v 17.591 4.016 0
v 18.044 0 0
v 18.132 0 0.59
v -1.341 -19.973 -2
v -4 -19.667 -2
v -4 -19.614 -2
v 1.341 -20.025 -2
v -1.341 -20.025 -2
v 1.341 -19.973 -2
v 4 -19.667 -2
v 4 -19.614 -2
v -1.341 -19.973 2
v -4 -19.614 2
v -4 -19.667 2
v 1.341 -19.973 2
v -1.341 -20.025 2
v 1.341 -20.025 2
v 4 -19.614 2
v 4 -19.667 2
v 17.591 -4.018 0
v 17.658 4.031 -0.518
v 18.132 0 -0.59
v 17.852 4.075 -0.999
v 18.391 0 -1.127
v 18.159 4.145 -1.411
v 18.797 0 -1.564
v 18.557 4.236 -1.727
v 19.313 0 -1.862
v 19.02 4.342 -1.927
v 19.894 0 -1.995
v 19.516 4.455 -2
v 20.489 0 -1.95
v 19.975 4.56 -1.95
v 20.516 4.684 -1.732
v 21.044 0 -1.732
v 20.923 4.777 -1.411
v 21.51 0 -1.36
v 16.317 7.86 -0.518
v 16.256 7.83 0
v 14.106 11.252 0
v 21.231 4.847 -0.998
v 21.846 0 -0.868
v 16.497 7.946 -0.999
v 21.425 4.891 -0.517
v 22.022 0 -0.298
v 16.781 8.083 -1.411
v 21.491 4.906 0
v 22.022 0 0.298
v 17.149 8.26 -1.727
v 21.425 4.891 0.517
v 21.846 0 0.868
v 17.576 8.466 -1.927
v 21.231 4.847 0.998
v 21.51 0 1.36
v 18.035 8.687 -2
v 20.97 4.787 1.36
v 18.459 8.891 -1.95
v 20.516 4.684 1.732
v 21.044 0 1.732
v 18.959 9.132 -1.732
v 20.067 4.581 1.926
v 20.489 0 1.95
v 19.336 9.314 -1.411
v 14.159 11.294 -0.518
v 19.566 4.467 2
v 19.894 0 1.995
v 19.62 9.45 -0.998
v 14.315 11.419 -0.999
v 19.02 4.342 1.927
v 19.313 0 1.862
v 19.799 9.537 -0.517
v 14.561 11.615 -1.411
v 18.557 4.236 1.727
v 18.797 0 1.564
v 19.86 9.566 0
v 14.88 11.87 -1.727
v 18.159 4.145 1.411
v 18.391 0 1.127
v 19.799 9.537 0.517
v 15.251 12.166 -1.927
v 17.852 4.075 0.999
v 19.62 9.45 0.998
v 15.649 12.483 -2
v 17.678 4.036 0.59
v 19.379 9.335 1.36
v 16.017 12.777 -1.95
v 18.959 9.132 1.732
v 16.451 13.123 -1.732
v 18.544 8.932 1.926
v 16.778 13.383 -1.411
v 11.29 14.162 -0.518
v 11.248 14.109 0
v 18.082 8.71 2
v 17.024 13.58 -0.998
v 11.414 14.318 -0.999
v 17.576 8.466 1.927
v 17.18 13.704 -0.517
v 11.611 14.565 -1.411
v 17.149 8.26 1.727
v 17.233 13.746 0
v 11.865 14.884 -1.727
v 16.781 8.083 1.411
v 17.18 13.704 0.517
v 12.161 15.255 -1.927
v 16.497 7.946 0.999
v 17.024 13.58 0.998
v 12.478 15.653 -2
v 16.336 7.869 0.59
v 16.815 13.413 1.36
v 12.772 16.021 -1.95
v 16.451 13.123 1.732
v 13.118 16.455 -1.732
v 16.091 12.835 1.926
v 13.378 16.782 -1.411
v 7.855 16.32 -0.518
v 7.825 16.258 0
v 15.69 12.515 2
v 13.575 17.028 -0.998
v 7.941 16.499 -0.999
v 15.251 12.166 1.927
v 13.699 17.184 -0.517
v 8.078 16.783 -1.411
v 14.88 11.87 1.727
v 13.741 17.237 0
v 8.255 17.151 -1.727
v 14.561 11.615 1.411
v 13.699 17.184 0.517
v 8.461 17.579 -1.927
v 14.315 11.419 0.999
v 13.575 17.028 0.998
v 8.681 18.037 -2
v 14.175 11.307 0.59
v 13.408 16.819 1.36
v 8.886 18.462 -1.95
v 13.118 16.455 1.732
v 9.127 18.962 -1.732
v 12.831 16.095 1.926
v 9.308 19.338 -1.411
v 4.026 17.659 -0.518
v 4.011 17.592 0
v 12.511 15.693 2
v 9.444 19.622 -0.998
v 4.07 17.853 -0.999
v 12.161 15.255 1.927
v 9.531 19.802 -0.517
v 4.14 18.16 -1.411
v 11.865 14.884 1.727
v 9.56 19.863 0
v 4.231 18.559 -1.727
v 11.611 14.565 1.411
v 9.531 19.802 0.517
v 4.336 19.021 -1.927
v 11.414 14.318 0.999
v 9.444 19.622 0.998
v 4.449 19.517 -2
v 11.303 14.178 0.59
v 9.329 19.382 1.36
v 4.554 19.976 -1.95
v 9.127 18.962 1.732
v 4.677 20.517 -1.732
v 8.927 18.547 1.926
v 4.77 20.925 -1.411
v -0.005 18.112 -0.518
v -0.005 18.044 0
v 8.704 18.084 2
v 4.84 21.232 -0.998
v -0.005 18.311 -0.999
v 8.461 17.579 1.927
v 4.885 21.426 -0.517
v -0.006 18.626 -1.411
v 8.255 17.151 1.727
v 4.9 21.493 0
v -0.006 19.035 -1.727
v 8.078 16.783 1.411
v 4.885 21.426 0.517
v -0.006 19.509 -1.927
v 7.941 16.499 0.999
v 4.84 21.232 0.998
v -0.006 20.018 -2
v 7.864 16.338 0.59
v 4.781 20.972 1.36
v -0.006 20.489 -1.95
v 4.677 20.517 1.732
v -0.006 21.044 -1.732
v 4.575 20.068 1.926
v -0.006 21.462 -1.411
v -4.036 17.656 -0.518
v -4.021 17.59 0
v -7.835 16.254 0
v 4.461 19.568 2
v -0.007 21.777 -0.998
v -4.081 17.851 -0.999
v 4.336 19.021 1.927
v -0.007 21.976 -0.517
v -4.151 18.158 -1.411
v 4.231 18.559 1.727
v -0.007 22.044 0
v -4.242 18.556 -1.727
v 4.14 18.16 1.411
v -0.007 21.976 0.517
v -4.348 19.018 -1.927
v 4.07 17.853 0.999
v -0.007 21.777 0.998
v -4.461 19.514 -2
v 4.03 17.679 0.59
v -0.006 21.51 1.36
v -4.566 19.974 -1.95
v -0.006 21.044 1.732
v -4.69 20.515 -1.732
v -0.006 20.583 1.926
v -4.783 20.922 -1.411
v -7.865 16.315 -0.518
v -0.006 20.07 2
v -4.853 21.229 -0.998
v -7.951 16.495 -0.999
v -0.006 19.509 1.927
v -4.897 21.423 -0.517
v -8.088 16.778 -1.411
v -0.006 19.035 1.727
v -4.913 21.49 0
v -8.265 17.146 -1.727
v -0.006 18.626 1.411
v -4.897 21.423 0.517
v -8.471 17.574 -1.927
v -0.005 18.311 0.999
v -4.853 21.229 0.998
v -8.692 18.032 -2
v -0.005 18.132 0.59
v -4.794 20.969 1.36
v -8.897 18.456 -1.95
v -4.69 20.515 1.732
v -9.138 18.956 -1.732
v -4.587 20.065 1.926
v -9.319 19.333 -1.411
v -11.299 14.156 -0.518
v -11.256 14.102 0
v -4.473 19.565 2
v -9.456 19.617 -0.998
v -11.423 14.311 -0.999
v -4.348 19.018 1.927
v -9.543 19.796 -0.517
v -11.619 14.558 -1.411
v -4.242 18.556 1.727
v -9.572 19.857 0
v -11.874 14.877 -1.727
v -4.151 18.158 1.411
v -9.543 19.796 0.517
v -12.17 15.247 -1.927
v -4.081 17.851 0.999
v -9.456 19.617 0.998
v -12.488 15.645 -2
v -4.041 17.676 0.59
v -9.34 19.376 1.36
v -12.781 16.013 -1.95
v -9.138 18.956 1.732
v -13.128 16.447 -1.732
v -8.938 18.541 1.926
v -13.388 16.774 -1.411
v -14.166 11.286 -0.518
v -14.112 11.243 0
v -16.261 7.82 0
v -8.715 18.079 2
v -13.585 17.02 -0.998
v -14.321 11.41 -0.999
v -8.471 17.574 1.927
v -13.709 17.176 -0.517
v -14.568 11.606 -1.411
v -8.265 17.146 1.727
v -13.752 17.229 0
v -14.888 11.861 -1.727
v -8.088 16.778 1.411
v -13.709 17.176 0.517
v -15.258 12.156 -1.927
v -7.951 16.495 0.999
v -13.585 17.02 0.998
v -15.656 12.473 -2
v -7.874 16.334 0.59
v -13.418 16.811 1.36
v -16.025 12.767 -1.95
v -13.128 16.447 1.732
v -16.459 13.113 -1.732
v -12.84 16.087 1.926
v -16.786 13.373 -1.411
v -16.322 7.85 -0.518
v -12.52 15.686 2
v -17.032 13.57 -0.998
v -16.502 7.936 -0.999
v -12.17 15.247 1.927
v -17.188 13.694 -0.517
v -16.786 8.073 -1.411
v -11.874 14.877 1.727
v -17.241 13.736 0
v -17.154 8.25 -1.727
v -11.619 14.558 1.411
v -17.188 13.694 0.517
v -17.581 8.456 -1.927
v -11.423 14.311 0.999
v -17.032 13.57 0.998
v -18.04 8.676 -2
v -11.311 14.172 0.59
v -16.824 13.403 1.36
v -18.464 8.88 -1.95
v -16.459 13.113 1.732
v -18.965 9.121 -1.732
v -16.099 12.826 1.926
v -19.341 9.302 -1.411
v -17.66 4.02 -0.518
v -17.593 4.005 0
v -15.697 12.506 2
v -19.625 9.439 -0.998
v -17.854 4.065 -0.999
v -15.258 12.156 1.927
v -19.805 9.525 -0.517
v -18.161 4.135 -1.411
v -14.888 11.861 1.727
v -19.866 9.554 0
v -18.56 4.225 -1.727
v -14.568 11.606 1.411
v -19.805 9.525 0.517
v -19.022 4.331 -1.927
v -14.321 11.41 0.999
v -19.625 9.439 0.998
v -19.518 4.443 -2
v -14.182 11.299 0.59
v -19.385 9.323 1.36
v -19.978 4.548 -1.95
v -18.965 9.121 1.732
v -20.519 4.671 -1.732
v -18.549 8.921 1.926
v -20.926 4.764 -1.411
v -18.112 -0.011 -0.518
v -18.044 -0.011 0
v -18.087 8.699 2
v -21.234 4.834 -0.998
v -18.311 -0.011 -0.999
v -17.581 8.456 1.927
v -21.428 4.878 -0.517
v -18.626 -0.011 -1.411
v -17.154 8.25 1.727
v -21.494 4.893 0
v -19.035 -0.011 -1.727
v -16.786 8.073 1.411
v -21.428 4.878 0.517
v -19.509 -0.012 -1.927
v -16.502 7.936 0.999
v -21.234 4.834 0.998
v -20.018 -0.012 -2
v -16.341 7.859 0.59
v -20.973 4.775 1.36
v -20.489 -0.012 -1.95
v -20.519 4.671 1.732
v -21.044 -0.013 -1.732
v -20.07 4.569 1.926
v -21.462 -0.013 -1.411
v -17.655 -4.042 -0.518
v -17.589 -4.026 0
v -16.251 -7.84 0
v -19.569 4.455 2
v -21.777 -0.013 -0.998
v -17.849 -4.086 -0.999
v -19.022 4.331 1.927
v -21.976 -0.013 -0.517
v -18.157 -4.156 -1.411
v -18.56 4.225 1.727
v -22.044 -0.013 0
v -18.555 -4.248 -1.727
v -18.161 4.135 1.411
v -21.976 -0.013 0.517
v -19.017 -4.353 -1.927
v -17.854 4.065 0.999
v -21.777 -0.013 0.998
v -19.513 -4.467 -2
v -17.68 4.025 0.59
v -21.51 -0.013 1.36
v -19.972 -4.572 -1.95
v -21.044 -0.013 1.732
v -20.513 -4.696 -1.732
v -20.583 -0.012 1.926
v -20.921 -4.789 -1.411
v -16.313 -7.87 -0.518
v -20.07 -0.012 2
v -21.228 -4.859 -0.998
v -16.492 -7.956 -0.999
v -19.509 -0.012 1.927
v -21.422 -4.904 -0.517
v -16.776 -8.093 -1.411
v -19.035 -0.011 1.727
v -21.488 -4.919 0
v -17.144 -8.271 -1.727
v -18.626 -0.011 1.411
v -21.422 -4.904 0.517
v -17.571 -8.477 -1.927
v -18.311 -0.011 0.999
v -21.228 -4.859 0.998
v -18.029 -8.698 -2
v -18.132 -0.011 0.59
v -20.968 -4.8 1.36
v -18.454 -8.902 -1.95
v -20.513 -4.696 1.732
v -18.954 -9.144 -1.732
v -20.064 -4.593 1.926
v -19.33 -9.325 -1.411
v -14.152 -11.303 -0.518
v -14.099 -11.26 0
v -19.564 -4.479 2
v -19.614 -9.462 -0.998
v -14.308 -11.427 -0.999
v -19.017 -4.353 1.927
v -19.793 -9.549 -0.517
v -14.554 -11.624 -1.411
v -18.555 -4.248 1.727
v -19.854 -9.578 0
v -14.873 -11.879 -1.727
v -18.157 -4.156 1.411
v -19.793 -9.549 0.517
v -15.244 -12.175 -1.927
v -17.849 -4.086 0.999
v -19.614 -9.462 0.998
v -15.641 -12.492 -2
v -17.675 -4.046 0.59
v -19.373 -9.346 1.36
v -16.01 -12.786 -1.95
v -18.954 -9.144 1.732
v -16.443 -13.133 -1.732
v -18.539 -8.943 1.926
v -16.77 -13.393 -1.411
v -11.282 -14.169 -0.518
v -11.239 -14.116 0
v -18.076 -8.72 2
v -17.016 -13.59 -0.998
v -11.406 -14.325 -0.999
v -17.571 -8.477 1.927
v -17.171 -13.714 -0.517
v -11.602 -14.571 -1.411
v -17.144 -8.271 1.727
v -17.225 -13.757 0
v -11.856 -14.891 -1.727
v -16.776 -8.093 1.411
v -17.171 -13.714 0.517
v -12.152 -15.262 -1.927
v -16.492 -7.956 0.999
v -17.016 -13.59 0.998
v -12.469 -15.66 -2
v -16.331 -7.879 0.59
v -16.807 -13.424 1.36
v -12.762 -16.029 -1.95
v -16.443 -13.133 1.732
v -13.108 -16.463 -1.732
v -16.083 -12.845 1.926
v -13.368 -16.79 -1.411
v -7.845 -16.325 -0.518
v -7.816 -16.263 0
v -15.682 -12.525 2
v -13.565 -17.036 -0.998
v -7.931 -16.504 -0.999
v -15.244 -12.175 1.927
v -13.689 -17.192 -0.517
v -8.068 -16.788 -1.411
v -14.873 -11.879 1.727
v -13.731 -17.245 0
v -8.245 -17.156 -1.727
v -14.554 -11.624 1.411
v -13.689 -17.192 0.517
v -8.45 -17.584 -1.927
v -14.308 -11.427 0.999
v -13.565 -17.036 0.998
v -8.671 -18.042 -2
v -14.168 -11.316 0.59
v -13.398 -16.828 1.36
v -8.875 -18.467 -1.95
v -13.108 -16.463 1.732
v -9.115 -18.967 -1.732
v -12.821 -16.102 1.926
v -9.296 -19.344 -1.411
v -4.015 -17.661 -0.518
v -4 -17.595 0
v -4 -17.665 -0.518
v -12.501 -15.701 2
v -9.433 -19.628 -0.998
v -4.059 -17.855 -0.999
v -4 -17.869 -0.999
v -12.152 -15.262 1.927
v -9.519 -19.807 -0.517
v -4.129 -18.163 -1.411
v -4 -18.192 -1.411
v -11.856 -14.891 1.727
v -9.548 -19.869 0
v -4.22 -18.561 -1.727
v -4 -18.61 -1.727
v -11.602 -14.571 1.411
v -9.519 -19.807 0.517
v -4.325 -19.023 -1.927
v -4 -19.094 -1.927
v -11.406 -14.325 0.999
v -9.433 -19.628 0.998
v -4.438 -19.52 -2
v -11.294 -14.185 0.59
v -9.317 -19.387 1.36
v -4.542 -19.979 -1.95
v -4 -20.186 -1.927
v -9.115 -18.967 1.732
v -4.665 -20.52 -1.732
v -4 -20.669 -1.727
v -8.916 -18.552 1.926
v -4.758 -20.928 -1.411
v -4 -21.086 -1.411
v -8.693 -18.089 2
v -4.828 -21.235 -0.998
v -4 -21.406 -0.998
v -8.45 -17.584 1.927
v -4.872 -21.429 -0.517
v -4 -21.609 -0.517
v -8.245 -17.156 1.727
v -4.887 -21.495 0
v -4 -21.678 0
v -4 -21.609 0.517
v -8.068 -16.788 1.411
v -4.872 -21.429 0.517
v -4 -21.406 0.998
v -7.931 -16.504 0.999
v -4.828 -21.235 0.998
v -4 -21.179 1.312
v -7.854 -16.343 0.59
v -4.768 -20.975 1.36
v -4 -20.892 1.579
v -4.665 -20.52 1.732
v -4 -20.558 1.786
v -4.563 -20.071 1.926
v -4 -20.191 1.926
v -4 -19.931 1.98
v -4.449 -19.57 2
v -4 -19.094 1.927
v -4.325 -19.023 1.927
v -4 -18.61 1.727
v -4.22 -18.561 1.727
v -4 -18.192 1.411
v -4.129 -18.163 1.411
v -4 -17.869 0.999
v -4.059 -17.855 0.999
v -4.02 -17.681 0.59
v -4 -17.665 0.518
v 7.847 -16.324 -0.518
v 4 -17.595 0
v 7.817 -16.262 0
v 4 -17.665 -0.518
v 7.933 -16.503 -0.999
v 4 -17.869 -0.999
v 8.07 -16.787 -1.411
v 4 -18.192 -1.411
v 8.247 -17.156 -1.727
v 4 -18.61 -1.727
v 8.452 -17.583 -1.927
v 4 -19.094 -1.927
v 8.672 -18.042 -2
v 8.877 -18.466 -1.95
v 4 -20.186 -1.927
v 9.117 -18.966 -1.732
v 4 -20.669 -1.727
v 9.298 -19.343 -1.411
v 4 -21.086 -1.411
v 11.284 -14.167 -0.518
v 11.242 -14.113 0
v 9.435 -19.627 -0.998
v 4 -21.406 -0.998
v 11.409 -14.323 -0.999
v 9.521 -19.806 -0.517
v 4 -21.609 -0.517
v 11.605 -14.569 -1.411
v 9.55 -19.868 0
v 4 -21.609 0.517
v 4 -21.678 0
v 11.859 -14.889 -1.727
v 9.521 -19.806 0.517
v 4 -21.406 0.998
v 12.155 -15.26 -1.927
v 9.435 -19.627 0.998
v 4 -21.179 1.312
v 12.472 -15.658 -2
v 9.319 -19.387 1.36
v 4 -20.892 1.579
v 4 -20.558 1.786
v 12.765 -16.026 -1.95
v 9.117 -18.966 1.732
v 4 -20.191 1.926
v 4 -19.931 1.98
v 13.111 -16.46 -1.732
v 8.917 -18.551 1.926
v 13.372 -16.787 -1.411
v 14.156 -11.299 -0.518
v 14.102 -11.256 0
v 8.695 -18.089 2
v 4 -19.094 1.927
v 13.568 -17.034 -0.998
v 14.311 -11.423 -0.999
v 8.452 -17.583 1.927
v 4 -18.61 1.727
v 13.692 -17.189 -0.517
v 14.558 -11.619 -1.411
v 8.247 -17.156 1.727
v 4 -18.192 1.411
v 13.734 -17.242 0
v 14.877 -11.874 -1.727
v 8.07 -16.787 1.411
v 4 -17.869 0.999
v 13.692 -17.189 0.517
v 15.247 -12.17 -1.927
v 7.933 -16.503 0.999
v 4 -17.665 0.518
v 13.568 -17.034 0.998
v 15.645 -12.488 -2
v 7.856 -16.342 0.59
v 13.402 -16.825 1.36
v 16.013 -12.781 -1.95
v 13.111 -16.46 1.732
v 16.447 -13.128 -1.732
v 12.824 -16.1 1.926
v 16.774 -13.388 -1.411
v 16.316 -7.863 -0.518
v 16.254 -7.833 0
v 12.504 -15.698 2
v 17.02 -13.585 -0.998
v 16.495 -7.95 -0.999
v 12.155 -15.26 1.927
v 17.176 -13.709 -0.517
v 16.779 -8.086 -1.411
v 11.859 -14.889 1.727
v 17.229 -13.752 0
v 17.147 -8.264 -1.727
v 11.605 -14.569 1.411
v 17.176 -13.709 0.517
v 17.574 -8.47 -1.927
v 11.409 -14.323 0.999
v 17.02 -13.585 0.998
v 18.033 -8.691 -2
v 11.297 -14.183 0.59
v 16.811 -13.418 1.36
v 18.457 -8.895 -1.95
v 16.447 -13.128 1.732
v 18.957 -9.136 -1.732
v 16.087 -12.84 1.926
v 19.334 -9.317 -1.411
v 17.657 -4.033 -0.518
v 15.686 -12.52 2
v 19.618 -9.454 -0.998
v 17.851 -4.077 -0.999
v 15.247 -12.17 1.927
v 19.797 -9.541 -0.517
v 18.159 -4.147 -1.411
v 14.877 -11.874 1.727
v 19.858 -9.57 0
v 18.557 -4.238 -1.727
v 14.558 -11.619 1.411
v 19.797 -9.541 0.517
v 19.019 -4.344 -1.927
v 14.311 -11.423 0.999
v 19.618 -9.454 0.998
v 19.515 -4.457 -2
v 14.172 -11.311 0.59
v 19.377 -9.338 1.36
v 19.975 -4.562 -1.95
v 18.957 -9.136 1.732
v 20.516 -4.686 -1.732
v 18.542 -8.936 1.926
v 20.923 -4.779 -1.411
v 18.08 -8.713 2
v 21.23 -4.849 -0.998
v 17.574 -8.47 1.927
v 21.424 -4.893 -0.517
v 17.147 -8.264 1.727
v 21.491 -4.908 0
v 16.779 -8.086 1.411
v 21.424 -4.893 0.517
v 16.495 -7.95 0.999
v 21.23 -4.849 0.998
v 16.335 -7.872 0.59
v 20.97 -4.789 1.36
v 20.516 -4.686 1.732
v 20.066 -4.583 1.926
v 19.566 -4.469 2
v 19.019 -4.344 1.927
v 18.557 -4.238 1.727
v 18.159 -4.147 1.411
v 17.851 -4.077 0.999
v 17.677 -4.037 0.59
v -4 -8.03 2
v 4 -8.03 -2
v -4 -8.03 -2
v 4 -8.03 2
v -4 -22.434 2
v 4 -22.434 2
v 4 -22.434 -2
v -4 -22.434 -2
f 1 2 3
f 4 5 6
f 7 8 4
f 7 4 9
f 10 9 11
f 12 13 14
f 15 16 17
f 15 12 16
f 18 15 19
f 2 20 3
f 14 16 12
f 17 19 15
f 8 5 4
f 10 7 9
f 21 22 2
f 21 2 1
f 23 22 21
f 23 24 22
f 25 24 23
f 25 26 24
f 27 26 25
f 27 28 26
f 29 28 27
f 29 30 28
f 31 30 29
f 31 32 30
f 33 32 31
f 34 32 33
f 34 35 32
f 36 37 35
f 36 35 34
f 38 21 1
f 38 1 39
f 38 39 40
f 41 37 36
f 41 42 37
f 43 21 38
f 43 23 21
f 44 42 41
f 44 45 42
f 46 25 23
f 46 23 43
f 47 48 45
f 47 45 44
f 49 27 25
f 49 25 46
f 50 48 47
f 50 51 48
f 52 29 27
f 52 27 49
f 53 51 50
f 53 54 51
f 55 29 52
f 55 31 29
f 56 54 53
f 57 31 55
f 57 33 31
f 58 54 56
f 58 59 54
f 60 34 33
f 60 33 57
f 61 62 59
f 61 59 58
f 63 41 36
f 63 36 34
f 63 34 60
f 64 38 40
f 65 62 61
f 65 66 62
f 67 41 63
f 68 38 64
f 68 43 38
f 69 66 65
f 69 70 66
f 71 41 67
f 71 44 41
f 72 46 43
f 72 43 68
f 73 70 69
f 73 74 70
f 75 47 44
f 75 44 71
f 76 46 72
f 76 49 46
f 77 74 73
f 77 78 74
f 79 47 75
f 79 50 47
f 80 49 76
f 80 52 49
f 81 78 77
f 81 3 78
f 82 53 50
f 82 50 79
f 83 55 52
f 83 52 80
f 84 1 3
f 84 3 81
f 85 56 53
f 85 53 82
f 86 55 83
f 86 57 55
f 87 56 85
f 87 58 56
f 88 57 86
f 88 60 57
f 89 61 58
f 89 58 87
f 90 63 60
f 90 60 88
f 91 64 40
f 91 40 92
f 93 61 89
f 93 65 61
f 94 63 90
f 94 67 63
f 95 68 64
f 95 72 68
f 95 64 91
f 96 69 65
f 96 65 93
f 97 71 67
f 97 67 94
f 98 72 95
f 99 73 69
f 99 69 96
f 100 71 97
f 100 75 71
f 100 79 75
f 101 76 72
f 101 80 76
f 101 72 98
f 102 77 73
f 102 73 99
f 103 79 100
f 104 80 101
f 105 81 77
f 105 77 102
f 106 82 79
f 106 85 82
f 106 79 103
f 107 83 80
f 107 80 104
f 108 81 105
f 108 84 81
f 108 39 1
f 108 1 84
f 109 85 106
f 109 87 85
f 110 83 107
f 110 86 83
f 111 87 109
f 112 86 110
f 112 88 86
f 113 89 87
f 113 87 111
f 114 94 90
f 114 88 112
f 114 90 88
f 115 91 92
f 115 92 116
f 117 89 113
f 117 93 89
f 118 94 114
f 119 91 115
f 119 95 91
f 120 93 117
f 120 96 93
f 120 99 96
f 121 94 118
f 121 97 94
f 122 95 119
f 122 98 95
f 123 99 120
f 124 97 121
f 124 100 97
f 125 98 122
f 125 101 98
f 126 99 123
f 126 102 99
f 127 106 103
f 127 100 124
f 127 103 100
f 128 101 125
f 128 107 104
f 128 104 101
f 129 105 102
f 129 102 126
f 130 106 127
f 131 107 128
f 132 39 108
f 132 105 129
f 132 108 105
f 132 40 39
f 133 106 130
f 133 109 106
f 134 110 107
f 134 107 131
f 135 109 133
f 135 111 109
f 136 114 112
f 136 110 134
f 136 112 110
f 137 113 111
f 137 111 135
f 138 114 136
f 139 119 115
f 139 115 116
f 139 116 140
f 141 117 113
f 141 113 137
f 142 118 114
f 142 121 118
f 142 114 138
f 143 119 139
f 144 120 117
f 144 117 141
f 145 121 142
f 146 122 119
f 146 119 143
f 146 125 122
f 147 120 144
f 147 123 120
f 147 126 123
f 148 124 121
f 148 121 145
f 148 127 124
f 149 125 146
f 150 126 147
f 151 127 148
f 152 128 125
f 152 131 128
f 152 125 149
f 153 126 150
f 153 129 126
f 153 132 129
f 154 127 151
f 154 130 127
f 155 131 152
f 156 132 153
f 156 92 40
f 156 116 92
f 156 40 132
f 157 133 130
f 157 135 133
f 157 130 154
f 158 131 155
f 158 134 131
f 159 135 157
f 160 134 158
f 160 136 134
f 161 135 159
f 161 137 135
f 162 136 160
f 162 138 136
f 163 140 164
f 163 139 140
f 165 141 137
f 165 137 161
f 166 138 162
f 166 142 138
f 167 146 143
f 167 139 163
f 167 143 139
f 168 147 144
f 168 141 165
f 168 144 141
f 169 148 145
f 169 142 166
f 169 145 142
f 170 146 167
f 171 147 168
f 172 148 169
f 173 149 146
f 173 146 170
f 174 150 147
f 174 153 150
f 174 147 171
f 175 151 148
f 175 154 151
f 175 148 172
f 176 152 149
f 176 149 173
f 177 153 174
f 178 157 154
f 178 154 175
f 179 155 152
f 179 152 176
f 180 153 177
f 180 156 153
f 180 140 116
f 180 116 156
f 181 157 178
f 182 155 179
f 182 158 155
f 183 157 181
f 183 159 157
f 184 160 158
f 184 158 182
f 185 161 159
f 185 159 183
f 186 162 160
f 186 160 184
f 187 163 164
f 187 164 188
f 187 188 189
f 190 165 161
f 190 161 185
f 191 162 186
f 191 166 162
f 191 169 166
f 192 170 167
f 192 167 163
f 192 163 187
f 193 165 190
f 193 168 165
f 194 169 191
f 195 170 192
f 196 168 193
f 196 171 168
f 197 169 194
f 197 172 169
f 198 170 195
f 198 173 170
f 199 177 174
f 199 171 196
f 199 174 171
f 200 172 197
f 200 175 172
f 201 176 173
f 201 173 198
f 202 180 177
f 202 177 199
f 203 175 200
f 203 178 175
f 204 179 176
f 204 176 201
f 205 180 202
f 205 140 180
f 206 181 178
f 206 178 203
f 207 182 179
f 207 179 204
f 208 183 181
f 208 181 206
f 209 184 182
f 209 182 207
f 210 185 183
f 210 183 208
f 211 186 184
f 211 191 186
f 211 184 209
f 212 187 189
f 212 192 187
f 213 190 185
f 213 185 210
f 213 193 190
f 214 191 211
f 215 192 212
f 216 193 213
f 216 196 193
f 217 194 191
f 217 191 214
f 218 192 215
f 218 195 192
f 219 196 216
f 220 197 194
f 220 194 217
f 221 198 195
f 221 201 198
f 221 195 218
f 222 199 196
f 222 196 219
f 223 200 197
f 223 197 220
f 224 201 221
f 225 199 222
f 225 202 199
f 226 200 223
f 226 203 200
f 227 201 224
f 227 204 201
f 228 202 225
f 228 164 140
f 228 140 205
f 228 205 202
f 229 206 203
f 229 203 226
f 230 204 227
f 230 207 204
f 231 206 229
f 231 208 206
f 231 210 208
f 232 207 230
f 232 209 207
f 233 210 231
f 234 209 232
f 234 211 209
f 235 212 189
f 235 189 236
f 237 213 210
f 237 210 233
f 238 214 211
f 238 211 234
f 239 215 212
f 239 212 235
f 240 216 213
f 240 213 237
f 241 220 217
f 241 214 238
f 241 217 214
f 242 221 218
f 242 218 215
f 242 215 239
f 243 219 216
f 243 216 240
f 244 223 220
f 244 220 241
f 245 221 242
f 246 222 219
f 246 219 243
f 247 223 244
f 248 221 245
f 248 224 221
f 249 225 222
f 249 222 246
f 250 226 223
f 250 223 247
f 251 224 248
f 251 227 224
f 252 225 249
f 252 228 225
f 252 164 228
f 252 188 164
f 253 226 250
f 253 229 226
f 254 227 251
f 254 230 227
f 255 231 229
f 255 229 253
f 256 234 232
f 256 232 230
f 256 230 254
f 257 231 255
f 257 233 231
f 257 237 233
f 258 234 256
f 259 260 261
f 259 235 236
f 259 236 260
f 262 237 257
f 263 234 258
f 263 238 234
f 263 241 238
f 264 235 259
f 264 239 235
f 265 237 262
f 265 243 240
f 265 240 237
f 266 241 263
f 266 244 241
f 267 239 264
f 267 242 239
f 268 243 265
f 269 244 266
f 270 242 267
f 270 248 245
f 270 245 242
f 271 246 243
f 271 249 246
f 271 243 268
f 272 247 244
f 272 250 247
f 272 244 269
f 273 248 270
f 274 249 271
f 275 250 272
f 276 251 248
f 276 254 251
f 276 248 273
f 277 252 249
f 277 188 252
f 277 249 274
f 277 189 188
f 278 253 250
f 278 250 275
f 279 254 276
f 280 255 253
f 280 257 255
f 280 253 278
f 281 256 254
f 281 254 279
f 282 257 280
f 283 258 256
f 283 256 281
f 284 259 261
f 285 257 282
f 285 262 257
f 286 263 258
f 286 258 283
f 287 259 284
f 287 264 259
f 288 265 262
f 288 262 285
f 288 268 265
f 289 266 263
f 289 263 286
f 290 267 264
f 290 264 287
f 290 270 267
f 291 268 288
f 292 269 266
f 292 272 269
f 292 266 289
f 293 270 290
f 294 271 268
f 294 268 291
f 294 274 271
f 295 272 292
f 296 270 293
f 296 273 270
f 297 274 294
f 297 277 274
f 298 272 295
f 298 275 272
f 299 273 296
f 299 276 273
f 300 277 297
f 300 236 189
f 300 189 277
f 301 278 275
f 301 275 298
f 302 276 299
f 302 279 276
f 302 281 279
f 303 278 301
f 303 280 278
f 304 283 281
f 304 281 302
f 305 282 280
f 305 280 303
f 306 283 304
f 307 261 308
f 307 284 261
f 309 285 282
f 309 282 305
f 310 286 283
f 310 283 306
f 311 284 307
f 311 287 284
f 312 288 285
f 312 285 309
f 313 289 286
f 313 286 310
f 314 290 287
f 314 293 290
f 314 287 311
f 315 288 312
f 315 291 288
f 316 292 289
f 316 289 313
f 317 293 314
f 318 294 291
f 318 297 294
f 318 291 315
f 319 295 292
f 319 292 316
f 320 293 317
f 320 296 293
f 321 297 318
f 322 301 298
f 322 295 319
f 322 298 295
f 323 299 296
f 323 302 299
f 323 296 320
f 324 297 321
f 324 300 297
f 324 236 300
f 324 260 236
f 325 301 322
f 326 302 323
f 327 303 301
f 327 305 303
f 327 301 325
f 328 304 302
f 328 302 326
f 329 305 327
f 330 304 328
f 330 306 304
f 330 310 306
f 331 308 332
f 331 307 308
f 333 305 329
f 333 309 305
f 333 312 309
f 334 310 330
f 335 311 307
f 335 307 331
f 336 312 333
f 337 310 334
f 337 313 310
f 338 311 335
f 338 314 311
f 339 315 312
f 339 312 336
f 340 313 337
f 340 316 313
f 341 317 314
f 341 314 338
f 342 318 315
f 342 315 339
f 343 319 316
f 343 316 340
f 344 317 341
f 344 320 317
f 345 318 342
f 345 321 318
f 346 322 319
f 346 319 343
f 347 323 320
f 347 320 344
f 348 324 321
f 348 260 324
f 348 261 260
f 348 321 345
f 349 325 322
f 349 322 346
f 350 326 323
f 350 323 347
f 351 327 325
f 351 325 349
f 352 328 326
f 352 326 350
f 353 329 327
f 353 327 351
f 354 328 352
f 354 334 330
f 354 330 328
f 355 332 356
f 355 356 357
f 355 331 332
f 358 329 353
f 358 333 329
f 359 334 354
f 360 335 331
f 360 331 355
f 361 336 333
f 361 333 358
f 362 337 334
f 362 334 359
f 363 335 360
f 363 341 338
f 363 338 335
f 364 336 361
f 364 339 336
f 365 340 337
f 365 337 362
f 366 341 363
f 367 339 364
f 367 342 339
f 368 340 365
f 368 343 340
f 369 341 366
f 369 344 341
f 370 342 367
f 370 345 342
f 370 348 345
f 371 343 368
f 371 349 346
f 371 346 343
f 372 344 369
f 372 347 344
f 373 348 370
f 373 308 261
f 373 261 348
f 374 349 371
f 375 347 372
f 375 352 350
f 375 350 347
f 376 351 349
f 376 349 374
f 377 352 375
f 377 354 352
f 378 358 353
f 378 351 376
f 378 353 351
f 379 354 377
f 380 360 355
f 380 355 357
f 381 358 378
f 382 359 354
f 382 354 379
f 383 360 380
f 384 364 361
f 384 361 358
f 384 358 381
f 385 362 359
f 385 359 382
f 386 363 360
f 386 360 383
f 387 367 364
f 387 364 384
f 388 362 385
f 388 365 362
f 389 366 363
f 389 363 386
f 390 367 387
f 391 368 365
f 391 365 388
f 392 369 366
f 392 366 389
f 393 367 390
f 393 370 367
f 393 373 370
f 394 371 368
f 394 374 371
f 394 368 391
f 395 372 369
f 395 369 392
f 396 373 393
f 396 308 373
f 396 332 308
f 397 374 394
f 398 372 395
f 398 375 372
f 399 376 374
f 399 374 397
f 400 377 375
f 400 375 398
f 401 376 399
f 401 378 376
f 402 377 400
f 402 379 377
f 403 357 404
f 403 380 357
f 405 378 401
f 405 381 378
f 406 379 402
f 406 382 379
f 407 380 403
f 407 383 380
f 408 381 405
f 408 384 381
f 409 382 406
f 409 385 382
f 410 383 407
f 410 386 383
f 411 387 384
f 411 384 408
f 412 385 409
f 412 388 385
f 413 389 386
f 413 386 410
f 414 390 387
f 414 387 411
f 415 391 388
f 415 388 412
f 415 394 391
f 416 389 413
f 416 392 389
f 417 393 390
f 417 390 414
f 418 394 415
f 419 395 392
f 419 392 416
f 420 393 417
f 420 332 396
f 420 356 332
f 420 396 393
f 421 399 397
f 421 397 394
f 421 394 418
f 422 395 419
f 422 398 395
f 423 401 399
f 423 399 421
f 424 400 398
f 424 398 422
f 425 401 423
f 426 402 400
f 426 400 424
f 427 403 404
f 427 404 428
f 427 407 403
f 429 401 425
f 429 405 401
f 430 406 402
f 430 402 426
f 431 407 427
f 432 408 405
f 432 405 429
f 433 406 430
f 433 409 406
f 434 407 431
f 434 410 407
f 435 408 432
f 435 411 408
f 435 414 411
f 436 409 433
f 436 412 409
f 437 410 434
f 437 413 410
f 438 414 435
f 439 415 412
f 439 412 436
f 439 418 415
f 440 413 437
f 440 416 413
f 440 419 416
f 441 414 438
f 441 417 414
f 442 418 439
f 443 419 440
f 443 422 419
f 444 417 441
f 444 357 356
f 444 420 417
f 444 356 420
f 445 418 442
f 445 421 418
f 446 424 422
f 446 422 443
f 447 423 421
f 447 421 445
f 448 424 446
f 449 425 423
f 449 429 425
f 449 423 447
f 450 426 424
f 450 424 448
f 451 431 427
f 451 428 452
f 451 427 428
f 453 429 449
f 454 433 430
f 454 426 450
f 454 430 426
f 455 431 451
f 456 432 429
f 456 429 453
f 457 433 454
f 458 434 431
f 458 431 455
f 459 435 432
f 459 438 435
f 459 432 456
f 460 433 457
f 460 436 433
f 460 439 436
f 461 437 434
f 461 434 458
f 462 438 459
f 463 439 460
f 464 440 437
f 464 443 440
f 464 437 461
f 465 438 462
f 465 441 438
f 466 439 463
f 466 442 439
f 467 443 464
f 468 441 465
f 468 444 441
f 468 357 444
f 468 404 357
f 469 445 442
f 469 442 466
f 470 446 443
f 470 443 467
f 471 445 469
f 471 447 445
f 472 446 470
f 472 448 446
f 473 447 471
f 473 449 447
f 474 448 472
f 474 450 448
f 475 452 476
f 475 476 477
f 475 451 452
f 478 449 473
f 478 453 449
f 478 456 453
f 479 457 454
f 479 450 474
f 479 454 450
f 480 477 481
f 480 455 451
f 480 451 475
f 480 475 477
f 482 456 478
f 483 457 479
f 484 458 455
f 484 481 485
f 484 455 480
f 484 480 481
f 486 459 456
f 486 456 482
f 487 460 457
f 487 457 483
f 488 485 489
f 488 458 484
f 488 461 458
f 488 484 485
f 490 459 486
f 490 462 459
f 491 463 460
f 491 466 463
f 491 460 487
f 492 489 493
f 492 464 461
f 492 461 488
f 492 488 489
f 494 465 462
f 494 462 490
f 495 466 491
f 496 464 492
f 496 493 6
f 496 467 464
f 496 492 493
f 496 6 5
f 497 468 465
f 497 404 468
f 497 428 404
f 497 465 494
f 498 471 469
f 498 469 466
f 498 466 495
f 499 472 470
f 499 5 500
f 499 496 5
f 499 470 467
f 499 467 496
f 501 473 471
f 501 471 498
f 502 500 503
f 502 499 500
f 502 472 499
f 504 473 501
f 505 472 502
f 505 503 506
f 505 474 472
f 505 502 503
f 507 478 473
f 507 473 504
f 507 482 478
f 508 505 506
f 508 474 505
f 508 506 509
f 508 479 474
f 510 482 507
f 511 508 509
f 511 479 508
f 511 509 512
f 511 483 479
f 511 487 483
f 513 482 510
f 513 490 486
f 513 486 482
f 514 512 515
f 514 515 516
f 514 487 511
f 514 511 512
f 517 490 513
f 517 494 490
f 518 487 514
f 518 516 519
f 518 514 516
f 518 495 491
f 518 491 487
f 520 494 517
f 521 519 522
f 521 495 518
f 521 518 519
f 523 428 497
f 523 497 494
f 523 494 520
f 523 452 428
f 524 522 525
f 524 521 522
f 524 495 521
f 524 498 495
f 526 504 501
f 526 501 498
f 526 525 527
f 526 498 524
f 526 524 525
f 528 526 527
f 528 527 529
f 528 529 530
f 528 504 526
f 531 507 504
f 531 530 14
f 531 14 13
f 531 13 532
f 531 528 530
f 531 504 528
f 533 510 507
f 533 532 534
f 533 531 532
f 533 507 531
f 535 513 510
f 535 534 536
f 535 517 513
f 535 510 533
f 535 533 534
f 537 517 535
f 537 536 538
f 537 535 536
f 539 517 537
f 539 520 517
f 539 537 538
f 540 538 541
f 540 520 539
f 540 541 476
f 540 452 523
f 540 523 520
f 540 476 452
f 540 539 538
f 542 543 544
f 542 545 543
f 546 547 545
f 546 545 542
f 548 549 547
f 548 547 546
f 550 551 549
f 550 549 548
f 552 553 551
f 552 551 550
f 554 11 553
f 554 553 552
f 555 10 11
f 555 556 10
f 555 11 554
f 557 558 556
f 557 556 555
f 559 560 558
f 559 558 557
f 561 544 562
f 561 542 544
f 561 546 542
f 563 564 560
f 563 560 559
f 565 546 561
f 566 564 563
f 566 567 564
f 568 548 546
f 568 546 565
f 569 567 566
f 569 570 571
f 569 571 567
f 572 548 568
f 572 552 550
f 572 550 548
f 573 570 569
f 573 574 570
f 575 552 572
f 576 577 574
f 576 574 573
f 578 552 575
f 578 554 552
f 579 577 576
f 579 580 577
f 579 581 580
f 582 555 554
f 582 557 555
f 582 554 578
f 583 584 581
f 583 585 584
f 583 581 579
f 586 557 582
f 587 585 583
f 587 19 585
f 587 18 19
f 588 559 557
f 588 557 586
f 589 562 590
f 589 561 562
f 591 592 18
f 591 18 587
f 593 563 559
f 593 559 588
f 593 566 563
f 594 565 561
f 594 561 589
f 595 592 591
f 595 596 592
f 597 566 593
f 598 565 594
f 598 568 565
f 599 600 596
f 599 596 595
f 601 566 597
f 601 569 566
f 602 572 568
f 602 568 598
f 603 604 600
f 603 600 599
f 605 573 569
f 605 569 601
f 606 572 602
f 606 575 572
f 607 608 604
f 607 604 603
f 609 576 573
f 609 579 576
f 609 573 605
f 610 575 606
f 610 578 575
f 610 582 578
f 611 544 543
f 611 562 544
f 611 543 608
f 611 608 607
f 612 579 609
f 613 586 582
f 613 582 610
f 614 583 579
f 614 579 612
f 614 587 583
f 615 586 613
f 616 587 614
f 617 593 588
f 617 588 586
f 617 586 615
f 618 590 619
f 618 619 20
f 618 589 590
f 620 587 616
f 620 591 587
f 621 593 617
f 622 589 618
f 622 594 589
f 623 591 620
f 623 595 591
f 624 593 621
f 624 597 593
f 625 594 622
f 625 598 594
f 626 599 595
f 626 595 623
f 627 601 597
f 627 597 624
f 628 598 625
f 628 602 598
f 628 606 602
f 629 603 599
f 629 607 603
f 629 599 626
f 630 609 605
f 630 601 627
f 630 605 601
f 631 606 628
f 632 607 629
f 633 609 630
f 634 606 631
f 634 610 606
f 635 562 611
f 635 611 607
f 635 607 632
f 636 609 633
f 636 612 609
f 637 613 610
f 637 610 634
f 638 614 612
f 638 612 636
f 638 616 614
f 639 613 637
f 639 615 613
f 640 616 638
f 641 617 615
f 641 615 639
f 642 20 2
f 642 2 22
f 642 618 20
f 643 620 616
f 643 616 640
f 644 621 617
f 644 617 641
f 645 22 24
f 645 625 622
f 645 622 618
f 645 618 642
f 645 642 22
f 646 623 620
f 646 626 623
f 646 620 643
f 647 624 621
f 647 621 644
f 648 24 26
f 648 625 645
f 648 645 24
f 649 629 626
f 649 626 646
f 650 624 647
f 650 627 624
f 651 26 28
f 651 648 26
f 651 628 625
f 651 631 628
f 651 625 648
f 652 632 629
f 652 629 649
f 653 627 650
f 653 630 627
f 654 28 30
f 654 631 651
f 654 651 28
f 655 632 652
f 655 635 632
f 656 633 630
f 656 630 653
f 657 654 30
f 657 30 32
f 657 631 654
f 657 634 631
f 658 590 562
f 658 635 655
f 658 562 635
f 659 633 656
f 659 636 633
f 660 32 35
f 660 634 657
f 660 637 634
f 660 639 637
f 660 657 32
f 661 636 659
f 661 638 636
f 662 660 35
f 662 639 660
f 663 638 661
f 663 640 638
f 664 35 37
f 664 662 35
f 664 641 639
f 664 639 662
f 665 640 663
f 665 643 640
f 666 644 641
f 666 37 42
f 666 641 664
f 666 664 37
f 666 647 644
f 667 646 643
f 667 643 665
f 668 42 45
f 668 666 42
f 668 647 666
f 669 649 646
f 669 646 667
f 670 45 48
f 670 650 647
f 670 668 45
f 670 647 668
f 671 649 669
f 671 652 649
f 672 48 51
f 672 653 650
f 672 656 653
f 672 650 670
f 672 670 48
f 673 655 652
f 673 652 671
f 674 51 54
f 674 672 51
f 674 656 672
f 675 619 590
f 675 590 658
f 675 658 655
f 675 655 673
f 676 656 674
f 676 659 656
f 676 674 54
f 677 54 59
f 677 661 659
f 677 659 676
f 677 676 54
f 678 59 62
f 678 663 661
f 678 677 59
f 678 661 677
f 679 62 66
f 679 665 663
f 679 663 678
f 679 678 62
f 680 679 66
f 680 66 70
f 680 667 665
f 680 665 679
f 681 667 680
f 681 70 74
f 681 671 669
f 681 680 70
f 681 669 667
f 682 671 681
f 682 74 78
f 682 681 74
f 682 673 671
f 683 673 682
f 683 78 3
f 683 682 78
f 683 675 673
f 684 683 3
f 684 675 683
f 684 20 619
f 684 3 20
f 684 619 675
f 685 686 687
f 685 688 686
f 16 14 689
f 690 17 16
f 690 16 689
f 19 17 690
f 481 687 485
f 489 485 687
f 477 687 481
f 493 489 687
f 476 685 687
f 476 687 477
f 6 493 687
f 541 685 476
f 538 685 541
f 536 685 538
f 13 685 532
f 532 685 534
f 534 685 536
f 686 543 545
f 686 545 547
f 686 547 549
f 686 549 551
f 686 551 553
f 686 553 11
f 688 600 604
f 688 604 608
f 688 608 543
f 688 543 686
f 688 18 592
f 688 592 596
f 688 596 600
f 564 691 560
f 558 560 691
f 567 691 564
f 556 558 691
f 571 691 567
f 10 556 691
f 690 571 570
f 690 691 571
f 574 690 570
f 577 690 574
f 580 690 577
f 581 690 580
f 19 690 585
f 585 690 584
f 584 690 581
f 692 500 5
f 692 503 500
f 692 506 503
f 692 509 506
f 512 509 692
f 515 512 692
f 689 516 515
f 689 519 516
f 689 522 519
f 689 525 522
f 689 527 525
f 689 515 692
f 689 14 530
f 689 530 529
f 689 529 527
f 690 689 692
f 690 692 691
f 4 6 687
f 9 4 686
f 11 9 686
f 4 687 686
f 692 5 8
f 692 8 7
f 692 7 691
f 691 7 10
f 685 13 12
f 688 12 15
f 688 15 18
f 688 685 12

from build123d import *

# Parameters (mm, degrees)
F1_R          = 2.00017
F4_DEPTH      = 2
F4_DEPTH_BACK = 2


with BuildPart() as f2:
    # F2: sweep along a path in F0
    with BuildLine(Plane.XY) as f2_path:
        CenterArc((0, 0), 18, 0, 360)
    # F1 (on Front) → F2 (sweep)
    with BuildSketch(Plane.XZ):
        with Locations((-20.043772, 0)):
            Circle(F1_R)
    sweep(path=f2_path.line)

    # F3 (on Top) → F4 (join, two sides)
    with BuildSketch(Plane.XY) as f4_sk:
        Polygon((4, -8.030277), (0, -8.030277), (-4, -8.030277), (-4, -19.934135), (-4, -22.434135), (4, -22.434135), (4, -19.934135), align=None)
    extrude(amount=F4_DEPTH)
    extrude(f4_sk.sketch, amount=-F4_DEPTH_BACK)


solid = f2.part
